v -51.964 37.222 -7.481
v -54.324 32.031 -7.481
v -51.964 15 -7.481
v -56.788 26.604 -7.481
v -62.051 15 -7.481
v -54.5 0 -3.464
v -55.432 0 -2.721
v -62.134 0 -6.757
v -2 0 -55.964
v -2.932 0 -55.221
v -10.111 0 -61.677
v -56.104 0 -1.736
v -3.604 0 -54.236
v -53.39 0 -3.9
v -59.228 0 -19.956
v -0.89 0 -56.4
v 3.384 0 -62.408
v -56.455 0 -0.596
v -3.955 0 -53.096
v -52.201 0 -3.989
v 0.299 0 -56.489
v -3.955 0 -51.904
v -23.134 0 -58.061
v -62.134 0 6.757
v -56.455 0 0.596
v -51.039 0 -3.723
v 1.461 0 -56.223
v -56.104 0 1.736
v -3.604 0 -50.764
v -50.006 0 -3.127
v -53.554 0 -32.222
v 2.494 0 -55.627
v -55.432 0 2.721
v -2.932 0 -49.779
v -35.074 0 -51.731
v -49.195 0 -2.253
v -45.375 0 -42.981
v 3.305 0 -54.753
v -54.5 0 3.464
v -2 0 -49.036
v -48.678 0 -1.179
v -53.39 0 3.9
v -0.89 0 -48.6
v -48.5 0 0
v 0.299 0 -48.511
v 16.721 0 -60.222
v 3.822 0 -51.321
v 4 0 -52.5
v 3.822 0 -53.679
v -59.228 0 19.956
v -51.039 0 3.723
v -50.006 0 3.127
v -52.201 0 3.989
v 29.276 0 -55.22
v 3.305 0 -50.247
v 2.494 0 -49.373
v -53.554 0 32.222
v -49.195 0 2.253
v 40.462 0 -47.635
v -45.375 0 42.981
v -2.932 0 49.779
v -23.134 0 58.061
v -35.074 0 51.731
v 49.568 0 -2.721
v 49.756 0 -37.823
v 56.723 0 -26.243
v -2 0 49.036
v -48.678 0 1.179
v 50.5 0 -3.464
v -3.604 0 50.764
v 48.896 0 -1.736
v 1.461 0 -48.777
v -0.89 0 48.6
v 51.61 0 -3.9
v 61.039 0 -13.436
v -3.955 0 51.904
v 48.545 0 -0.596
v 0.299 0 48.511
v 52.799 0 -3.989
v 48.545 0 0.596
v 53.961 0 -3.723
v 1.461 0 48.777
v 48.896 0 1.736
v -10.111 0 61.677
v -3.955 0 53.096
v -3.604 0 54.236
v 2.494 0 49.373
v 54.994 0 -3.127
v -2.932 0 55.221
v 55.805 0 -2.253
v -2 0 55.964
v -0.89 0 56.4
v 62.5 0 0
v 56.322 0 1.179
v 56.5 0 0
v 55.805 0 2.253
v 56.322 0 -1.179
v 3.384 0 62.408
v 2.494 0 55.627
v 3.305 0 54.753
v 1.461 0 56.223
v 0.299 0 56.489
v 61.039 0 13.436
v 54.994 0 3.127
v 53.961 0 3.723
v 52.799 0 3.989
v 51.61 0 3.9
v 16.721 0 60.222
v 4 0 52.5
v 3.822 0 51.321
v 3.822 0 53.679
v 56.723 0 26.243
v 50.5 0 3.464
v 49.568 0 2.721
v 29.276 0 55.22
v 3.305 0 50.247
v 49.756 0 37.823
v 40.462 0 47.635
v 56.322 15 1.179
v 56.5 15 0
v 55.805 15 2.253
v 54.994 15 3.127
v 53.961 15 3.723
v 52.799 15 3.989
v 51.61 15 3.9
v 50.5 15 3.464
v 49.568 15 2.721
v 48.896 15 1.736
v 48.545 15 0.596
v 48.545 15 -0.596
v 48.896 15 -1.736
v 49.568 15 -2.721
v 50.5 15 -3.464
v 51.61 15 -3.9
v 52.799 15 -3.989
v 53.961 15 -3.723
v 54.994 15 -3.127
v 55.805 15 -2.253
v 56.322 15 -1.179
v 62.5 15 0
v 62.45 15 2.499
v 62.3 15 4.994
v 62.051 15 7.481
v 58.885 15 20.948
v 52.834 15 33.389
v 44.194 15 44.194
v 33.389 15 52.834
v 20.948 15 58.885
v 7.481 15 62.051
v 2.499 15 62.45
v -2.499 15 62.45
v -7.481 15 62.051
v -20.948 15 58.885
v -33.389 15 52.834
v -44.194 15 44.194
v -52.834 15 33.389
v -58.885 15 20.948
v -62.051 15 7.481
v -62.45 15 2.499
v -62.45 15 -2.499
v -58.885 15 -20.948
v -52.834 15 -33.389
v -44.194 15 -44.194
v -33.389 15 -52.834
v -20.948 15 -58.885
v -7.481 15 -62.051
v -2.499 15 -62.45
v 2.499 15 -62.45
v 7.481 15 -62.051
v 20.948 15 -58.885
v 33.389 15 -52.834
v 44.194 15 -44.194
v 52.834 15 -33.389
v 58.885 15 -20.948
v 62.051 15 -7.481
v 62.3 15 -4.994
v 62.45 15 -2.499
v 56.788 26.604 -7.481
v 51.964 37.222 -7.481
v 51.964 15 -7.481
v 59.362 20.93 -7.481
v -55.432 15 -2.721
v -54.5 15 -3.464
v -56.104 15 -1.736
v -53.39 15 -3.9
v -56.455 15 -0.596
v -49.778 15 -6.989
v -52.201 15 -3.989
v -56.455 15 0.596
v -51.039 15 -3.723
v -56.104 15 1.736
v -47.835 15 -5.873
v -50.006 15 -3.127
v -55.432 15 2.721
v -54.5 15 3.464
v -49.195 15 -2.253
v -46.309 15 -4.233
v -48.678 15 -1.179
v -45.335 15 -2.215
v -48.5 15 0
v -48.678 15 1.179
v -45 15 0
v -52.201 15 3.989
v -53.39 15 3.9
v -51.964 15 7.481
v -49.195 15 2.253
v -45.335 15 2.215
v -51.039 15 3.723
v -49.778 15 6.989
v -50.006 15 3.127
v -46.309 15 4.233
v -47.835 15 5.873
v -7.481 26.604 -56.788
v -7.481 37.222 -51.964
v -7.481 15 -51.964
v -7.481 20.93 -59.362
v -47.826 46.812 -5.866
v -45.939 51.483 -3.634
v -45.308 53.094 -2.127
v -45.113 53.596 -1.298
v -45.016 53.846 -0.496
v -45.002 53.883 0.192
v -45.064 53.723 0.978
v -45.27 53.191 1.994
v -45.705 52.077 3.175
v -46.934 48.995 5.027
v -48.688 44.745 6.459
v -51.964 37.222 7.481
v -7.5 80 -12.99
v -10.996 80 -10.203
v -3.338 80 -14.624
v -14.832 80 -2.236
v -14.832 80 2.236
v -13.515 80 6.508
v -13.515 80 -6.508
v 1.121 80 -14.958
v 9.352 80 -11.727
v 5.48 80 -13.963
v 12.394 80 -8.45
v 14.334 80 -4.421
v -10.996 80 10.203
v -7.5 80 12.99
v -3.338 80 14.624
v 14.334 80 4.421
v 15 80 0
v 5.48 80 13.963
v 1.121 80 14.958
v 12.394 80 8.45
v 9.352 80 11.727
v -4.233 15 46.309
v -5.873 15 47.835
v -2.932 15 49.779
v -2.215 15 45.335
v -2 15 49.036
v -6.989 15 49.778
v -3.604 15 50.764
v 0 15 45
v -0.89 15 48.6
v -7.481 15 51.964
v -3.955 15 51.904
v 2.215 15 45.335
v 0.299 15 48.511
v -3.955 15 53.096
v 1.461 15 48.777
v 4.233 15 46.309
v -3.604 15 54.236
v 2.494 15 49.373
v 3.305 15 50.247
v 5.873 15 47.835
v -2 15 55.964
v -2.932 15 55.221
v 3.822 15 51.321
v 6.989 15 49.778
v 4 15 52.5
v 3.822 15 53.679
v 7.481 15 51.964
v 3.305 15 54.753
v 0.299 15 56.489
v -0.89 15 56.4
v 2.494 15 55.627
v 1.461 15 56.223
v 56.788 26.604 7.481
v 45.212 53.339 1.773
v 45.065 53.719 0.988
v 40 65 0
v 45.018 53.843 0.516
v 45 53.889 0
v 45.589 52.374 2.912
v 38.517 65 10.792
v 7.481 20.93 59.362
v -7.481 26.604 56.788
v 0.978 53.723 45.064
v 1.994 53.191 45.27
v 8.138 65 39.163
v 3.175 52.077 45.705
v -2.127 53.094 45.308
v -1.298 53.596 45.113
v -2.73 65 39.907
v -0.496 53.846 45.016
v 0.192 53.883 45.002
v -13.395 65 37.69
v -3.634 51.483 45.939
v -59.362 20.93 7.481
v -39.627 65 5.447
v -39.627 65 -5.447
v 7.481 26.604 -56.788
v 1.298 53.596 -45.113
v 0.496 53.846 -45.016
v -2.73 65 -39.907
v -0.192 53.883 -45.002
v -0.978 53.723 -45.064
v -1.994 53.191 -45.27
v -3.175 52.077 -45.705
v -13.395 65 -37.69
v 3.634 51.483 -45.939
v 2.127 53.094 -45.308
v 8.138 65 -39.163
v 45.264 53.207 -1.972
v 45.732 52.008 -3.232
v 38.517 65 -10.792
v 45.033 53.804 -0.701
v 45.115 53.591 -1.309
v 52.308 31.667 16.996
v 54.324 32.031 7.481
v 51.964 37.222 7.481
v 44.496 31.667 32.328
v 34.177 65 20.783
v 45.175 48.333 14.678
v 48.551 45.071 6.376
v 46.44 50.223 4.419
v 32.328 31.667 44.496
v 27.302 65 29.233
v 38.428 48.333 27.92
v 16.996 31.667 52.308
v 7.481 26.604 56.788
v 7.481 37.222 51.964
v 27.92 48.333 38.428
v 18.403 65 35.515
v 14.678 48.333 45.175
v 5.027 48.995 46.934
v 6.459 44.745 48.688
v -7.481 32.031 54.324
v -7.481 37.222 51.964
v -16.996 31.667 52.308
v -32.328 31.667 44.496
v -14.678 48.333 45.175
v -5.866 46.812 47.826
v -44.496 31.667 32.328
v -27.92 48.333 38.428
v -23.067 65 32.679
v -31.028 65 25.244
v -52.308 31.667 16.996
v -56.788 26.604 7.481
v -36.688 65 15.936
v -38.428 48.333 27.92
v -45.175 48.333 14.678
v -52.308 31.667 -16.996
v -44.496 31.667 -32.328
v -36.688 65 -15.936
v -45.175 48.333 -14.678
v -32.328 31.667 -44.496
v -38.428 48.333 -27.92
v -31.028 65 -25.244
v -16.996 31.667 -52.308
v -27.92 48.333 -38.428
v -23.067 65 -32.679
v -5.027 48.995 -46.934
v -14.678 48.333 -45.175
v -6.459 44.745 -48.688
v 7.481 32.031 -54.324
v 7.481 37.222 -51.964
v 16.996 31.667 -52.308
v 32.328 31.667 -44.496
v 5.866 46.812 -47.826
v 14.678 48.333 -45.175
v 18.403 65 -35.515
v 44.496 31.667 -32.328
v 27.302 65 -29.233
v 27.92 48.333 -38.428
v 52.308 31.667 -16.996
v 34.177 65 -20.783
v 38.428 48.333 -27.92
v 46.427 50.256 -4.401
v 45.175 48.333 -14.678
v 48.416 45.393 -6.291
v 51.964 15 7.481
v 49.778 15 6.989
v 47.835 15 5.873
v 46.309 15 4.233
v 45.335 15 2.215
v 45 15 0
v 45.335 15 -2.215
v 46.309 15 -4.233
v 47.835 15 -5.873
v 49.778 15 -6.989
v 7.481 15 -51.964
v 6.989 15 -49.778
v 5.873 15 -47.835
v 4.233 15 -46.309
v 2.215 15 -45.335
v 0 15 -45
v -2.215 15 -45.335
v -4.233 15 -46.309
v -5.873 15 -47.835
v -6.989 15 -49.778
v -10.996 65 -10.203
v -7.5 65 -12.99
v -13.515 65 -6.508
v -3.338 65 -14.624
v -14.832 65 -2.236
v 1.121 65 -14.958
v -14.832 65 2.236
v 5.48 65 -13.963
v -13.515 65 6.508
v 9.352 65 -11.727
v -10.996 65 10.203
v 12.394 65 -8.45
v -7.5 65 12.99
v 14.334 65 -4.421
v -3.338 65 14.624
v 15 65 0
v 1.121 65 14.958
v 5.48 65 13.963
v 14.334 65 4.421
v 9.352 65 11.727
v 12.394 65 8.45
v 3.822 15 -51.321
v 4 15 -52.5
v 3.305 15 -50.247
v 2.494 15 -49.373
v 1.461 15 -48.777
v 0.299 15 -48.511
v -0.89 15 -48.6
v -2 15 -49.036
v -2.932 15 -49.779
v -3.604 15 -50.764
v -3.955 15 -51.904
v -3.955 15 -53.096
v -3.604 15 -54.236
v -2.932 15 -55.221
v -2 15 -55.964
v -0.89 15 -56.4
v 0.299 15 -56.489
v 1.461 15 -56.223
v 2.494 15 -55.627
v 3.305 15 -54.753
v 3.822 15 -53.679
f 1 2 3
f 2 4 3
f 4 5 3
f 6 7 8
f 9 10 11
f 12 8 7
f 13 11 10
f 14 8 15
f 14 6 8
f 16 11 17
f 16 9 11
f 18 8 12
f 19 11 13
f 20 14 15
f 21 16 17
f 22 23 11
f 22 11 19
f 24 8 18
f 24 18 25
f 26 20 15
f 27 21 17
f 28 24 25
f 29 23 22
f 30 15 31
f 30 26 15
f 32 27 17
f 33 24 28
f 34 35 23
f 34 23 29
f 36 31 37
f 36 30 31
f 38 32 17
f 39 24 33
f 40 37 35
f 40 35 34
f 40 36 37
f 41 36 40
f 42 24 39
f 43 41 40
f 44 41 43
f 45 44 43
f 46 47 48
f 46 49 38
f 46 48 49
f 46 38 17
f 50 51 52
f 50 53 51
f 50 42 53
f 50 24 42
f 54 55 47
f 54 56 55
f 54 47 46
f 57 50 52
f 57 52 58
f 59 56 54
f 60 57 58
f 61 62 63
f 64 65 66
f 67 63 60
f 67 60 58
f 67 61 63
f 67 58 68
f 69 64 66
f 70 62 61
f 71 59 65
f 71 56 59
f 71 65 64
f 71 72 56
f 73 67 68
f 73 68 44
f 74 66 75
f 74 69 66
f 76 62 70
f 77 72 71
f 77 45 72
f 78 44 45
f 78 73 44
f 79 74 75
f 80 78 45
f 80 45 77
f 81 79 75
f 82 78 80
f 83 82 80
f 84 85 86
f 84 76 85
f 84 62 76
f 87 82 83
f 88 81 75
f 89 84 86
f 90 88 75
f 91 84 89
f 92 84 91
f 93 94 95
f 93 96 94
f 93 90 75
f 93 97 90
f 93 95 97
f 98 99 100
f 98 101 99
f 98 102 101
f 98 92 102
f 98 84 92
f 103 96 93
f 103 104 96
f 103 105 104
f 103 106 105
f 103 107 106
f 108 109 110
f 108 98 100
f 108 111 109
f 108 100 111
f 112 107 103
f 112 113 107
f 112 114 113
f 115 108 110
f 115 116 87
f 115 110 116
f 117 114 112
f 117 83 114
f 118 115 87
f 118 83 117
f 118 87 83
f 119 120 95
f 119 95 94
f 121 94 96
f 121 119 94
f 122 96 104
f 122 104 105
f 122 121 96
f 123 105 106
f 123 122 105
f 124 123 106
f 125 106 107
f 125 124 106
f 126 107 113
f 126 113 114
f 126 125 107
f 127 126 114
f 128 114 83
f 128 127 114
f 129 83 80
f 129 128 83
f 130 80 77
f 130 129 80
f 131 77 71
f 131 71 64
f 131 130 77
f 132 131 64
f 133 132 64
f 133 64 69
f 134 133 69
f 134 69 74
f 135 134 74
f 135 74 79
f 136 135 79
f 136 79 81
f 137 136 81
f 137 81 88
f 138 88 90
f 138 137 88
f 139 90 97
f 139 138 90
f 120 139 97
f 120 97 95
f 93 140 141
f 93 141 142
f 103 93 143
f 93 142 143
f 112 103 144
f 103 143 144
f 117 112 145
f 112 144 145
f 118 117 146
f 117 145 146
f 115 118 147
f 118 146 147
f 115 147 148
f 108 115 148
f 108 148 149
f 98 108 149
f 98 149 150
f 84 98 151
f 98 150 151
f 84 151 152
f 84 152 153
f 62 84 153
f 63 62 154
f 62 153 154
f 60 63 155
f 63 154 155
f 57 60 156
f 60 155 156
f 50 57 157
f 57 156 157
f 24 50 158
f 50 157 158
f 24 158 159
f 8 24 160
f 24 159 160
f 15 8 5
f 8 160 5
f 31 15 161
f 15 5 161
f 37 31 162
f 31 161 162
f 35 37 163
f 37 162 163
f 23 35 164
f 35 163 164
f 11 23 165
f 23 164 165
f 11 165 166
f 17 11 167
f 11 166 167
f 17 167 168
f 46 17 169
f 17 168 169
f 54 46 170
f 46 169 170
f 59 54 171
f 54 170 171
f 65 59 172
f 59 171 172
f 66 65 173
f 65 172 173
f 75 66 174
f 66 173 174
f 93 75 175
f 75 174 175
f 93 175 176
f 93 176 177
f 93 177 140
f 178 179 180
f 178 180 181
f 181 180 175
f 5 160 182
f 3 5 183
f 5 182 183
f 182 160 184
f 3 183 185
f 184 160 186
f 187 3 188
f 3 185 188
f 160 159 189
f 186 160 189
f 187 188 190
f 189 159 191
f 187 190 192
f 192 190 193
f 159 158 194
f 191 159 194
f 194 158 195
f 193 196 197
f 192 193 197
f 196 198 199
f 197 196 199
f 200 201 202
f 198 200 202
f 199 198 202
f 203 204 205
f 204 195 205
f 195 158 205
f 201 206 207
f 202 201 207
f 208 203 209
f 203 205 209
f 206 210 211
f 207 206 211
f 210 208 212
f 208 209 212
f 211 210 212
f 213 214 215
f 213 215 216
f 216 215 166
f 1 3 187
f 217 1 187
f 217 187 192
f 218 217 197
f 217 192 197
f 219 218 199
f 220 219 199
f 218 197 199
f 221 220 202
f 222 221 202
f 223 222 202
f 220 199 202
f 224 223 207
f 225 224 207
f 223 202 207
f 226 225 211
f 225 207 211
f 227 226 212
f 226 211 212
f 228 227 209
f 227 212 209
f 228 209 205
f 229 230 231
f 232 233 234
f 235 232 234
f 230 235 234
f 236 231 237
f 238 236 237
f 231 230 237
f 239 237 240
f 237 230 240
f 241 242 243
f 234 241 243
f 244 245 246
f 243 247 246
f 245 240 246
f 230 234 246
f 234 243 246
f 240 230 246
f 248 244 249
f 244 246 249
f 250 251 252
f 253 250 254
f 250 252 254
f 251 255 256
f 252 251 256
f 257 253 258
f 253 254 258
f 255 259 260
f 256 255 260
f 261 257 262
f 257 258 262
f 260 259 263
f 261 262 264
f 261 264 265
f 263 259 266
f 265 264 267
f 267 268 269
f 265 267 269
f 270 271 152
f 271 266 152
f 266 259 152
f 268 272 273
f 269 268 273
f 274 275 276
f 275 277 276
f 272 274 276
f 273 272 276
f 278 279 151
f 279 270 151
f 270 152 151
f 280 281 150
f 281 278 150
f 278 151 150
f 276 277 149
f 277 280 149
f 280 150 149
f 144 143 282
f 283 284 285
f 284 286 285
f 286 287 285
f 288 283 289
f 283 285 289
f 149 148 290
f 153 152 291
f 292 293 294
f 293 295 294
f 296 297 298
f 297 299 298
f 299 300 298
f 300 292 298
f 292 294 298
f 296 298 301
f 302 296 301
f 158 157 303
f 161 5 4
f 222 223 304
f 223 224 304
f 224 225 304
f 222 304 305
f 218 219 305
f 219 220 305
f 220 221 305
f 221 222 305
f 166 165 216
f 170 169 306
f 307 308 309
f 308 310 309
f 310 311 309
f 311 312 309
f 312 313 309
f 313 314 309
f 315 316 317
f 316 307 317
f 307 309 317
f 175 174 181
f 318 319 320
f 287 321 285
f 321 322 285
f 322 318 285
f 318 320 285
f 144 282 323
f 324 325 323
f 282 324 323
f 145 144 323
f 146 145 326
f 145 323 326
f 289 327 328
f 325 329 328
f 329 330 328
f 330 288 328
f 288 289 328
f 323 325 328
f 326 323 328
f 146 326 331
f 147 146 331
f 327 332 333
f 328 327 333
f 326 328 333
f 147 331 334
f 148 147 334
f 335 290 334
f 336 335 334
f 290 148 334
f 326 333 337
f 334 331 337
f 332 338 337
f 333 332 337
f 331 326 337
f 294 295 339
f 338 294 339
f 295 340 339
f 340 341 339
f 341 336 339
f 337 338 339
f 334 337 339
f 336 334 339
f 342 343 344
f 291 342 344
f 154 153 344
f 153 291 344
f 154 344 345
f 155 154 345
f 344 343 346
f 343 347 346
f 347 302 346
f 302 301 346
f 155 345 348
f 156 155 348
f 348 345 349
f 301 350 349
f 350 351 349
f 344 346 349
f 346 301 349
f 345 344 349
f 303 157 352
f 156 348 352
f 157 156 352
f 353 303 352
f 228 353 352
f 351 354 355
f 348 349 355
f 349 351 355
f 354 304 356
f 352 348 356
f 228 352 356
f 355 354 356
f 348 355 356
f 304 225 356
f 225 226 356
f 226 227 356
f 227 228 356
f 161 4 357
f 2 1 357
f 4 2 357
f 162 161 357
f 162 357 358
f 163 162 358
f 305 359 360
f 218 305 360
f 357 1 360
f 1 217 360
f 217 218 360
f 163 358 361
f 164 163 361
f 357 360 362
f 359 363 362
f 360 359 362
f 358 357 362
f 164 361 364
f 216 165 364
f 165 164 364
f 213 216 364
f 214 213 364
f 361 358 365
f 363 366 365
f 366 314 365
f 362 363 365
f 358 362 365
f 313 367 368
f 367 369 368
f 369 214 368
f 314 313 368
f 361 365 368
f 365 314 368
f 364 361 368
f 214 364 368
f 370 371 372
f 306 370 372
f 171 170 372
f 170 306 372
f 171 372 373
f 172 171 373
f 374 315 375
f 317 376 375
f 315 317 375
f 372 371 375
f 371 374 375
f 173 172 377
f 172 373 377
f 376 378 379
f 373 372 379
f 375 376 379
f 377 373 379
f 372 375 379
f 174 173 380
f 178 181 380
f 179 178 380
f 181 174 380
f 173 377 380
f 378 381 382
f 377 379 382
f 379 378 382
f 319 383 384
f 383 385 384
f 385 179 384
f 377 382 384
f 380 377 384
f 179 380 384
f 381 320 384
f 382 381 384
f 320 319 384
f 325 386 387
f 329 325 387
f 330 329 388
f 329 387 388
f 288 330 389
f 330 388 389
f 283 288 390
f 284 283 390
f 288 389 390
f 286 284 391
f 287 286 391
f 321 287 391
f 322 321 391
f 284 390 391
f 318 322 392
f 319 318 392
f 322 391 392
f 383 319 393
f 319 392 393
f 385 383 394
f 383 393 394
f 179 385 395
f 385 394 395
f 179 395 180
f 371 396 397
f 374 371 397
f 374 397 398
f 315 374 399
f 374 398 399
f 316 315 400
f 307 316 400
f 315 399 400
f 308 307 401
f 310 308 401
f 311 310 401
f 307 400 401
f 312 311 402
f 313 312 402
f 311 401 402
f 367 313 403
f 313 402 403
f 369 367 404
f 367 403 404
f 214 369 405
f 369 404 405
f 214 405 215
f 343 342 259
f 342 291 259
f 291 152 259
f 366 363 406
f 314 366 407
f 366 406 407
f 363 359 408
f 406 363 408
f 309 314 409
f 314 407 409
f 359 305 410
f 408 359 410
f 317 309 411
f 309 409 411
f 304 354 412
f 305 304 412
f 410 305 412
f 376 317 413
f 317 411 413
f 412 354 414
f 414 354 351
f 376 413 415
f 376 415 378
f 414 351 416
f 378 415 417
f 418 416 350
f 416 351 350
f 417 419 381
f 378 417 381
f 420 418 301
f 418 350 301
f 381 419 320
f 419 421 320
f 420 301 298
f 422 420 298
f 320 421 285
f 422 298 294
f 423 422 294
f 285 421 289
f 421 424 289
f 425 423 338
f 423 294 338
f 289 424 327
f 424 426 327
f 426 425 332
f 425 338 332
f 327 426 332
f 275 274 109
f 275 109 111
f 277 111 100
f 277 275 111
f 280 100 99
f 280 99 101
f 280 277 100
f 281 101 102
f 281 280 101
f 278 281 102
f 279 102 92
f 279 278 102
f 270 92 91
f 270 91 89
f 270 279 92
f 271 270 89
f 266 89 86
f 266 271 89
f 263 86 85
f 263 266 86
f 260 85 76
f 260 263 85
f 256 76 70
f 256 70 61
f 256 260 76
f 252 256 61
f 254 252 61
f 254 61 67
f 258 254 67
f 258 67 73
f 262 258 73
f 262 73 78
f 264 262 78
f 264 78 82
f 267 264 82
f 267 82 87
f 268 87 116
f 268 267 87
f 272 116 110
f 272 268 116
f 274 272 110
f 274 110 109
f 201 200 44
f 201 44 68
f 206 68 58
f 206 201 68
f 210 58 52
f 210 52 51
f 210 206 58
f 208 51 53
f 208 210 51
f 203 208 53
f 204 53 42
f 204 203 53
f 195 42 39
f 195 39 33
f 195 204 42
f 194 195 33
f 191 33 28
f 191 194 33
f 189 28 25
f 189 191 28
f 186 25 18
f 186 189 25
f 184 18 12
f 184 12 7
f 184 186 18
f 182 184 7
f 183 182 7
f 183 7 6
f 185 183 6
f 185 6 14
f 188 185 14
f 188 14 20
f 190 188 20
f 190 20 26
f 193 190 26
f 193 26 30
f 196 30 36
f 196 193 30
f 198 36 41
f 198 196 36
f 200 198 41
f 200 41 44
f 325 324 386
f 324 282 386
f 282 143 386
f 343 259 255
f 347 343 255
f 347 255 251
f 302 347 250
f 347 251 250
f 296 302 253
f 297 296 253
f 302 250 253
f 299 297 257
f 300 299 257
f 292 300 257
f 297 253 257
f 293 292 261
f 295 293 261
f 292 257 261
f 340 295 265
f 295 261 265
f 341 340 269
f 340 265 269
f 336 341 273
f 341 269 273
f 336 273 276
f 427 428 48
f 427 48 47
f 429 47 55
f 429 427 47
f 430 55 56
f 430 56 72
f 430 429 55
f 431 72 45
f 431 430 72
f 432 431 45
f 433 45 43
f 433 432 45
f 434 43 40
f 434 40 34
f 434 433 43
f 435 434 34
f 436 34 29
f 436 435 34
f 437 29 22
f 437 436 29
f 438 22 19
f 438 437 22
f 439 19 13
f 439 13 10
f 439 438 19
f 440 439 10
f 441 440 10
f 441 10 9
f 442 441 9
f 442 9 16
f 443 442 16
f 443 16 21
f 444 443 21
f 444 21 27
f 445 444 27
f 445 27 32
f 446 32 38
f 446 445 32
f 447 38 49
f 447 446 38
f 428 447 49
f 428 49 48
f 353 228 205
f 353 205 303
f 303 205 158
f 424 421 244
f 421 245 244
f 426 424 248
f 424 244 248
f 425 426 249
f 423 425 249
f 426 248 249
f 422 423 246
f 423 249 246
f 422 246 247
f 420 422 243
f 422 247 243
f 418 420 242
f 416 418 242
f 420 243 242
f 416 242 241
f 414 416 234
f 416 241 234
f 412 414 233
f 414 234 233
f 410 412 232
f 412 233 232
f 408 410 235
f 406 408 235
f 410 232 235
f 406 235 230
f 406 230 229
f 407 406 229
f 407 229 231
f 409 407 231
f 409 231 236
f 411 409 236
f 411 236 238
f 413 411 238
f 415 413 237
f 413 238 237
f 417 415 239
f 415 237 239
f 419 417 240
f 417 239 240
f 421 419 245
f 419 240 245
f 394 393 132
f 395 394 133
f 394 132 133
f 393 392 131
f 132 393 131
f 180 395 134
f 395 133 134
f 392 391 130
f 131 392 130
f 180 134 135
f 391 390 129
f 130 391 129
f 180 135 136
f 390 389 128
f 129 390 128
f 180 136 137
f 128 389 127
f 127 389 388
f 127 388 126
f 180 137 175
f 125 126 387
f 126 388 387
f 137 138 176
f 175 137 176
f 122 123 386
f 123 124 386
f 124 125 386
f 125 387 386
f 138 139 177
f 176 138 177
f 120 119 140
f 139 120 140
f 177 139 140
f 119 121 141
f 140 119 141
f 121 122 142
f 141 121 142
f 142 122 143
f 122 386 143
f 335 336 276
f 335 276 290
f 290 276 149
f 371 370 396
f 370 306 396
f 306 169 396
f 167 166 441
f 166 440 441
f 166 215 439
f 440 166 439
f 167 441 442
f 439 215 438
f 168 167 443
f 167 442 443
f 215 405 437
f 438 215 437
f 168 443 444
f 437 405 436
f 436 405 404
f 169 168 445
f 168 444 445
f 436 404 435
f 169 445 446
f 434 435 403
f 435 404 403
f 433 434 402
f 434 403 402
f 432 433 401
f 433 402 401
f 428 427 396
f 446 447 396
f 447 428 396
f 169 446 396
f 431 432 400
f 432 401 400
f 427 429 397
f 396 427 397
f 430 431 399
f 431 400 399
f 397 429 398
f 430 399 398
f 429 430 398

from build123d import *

# Parameters (mm, degrees)
SKETCH4_R           = 62.5
SKETCH4_R_2         = 4
BOSS_EXTRUDE2_DEPTH = 15
CUT_EXTRUDE1_REACH  = 111.716


with BuildPart() as part:
    # Sketch3 → Revolve1 (revolve)
    with BuildSketch(Plane.XY):
        Polygon((0, 15), (62.5, 15), (40, 65), (15, 65), (15, 80), (0, 80), (0, 65), align=None)
    revolve(axis=Axis((0, 65, 0), (0, -1, 0)))

    # Sketch4 → Boss-Extrude2 (add)
    with BuildSketch(Plane.XZ.offset(-15)):
        Circle(SKETCH4_R)
        with Locations((0, -52.5)):
            Circle(SKETCH4_R_2, mode=Mode.SUBTRACT)
        with Locations((-52.5, 0)):
            Circle(SKETCH4_R_2, mode=Mode.SUBTRACT)
        with Locations((0, 52.5)):
            Circle(SKETCH4_R_2, mode=Mode.SUBTRACT)
        with Locations((52.5, 0)):
            Circle(SKETCH4_R_2, mode=Mode.SUBTRACT)
    extrude(amount=BOSS_EXTRUDE2_DEPTH)

    # Sketch4<5> → Cut-Extrude1 (cut, up to next)
    with BuildSketch(Plane.XZ.offset(-15), mode=Mode.PRIVATE) as cut_extrude1_sk1:
        with BuildLine():
            Line((7.480842881, -62.050680817), (7.480842881, -51.964285714))
            ThreePointArc((7.480842881, -51.964285714), (0, -45), (-7.480842881, -51.964285714))
            Line((-7.480842881, -51.964285714), (-7.480842881, -62.050680817))
            ThreePointArc((-7.480842881, -62.050680817), (0, -62.5), (7.480842881, -62.050680817))
        make_face()
    cut_extrude1_tool1 = extrude(cut_extrude1_sk1.sketch, amount=-CUT_EXTRUDE1_REACH, mode=Mode.PRIVATE) & part.part
    # Sketch4<5> → Cut-Extrude1 (cut, up to next)
    with BuildSketch(Plane.XZ.offset(-15), mode=Mode.PRIVATE) as cut_extrude1_sk2:
        with BuildLine():
            Line((51.964285714, -7.480842881), (62.050680817, -7.480842881))
            ThreePointArc((62.050680817, -7.480842881), (62.5, 0), (62.050680817, 7.480842881))
            Line((62.050680817, 7.480842881), (51.964285714, 7.480842881))
            ThreePointArc((51.964285714, 7.480842881), (45, 0), (51.964285714, -7.480842881))
        make_face()
    cut_extrude1_tool2 = extrude(cut_extrude1_sk2.sketch, amount=-CUT_EXTRUDE1_REACH, mode=Mode.PRIVATE) & part.part
    # Sketch4<5> → Cut-Extrude1 (cut, up to next)
    with BuildSketch(Plane.XZ.offset(-15), mode=Mode.PRIVATE) as cut_extrude1_sk3:
        with BuildLine():
            ThreePointArc((-62.050680817, 7.480842881), (-62.5, 0), (-62.050680817, -7.480842881))
            Line((-62.050680817, -7.480842881), (-51.964285714, -7.480842881))
            ThreePointArc((-51.964285714, -7.480842881), (-45, 0), (-51.964285714, 7.480842881))
            Line((-51.964285714, 7.480842881), (-62.050680817, 7.480842881))
        make_face()
    cut_extrude1_tool3 = extrude(cut_extrude1_sk3.sketch, amount=-CUT_EXTRUDE1_REACH, mode=Mode.PRIVATE) & part.part
    # Sketch4<5> → Cut-Extrude1 (cut, up to next)
    with BuildSketch(Plane.XZ.offset(-15), mode=Mode.PRIVATE) as cut_extrude1_sk4:
        with BuildLine():
            ThreePointArc((7.480842881, 62.050680817), (0, 62.5), (-7.480842881, 62.050680817))
            Line((-7.480842881, 62.050680817), (-7.480842881, 51.964285714))
            ThreePointArc((-7.480842881, 51.964285714), (0, 45), (7.480842881, 51.964285714))
            Line((7.480842881, 51.964285714), (7.480842881, 62.050680817))
        make_face()
    cut_extrude1_tool4 = extrude(cut_extrude1_sk4.sketch, amount=-CUT_EXTRUDE1_REACH, mode=Mode.PRIVATE) & part.part
    add(cut_extrude1_tool1.solids().sort_by_distance((0, 15, -54.386802))[0], mode=Mode.SUBTRACT)
    add(cut_extrude1_tool2.solids().sort_by_distance((54.386802, 15, 0))[0], mode=Mode.SUBTRACT)
    add(cut_extrude1_tool3.solids().sort_by_distance((-54.386802, 15, 0))[0], mode=Mode.SUBTRACT)
    add(cut_extrude1_tool4.solids().sort_by_distance((0, 15, 54.386802))[0], mode=Mode.SUBTRACT)


solid = part.part
